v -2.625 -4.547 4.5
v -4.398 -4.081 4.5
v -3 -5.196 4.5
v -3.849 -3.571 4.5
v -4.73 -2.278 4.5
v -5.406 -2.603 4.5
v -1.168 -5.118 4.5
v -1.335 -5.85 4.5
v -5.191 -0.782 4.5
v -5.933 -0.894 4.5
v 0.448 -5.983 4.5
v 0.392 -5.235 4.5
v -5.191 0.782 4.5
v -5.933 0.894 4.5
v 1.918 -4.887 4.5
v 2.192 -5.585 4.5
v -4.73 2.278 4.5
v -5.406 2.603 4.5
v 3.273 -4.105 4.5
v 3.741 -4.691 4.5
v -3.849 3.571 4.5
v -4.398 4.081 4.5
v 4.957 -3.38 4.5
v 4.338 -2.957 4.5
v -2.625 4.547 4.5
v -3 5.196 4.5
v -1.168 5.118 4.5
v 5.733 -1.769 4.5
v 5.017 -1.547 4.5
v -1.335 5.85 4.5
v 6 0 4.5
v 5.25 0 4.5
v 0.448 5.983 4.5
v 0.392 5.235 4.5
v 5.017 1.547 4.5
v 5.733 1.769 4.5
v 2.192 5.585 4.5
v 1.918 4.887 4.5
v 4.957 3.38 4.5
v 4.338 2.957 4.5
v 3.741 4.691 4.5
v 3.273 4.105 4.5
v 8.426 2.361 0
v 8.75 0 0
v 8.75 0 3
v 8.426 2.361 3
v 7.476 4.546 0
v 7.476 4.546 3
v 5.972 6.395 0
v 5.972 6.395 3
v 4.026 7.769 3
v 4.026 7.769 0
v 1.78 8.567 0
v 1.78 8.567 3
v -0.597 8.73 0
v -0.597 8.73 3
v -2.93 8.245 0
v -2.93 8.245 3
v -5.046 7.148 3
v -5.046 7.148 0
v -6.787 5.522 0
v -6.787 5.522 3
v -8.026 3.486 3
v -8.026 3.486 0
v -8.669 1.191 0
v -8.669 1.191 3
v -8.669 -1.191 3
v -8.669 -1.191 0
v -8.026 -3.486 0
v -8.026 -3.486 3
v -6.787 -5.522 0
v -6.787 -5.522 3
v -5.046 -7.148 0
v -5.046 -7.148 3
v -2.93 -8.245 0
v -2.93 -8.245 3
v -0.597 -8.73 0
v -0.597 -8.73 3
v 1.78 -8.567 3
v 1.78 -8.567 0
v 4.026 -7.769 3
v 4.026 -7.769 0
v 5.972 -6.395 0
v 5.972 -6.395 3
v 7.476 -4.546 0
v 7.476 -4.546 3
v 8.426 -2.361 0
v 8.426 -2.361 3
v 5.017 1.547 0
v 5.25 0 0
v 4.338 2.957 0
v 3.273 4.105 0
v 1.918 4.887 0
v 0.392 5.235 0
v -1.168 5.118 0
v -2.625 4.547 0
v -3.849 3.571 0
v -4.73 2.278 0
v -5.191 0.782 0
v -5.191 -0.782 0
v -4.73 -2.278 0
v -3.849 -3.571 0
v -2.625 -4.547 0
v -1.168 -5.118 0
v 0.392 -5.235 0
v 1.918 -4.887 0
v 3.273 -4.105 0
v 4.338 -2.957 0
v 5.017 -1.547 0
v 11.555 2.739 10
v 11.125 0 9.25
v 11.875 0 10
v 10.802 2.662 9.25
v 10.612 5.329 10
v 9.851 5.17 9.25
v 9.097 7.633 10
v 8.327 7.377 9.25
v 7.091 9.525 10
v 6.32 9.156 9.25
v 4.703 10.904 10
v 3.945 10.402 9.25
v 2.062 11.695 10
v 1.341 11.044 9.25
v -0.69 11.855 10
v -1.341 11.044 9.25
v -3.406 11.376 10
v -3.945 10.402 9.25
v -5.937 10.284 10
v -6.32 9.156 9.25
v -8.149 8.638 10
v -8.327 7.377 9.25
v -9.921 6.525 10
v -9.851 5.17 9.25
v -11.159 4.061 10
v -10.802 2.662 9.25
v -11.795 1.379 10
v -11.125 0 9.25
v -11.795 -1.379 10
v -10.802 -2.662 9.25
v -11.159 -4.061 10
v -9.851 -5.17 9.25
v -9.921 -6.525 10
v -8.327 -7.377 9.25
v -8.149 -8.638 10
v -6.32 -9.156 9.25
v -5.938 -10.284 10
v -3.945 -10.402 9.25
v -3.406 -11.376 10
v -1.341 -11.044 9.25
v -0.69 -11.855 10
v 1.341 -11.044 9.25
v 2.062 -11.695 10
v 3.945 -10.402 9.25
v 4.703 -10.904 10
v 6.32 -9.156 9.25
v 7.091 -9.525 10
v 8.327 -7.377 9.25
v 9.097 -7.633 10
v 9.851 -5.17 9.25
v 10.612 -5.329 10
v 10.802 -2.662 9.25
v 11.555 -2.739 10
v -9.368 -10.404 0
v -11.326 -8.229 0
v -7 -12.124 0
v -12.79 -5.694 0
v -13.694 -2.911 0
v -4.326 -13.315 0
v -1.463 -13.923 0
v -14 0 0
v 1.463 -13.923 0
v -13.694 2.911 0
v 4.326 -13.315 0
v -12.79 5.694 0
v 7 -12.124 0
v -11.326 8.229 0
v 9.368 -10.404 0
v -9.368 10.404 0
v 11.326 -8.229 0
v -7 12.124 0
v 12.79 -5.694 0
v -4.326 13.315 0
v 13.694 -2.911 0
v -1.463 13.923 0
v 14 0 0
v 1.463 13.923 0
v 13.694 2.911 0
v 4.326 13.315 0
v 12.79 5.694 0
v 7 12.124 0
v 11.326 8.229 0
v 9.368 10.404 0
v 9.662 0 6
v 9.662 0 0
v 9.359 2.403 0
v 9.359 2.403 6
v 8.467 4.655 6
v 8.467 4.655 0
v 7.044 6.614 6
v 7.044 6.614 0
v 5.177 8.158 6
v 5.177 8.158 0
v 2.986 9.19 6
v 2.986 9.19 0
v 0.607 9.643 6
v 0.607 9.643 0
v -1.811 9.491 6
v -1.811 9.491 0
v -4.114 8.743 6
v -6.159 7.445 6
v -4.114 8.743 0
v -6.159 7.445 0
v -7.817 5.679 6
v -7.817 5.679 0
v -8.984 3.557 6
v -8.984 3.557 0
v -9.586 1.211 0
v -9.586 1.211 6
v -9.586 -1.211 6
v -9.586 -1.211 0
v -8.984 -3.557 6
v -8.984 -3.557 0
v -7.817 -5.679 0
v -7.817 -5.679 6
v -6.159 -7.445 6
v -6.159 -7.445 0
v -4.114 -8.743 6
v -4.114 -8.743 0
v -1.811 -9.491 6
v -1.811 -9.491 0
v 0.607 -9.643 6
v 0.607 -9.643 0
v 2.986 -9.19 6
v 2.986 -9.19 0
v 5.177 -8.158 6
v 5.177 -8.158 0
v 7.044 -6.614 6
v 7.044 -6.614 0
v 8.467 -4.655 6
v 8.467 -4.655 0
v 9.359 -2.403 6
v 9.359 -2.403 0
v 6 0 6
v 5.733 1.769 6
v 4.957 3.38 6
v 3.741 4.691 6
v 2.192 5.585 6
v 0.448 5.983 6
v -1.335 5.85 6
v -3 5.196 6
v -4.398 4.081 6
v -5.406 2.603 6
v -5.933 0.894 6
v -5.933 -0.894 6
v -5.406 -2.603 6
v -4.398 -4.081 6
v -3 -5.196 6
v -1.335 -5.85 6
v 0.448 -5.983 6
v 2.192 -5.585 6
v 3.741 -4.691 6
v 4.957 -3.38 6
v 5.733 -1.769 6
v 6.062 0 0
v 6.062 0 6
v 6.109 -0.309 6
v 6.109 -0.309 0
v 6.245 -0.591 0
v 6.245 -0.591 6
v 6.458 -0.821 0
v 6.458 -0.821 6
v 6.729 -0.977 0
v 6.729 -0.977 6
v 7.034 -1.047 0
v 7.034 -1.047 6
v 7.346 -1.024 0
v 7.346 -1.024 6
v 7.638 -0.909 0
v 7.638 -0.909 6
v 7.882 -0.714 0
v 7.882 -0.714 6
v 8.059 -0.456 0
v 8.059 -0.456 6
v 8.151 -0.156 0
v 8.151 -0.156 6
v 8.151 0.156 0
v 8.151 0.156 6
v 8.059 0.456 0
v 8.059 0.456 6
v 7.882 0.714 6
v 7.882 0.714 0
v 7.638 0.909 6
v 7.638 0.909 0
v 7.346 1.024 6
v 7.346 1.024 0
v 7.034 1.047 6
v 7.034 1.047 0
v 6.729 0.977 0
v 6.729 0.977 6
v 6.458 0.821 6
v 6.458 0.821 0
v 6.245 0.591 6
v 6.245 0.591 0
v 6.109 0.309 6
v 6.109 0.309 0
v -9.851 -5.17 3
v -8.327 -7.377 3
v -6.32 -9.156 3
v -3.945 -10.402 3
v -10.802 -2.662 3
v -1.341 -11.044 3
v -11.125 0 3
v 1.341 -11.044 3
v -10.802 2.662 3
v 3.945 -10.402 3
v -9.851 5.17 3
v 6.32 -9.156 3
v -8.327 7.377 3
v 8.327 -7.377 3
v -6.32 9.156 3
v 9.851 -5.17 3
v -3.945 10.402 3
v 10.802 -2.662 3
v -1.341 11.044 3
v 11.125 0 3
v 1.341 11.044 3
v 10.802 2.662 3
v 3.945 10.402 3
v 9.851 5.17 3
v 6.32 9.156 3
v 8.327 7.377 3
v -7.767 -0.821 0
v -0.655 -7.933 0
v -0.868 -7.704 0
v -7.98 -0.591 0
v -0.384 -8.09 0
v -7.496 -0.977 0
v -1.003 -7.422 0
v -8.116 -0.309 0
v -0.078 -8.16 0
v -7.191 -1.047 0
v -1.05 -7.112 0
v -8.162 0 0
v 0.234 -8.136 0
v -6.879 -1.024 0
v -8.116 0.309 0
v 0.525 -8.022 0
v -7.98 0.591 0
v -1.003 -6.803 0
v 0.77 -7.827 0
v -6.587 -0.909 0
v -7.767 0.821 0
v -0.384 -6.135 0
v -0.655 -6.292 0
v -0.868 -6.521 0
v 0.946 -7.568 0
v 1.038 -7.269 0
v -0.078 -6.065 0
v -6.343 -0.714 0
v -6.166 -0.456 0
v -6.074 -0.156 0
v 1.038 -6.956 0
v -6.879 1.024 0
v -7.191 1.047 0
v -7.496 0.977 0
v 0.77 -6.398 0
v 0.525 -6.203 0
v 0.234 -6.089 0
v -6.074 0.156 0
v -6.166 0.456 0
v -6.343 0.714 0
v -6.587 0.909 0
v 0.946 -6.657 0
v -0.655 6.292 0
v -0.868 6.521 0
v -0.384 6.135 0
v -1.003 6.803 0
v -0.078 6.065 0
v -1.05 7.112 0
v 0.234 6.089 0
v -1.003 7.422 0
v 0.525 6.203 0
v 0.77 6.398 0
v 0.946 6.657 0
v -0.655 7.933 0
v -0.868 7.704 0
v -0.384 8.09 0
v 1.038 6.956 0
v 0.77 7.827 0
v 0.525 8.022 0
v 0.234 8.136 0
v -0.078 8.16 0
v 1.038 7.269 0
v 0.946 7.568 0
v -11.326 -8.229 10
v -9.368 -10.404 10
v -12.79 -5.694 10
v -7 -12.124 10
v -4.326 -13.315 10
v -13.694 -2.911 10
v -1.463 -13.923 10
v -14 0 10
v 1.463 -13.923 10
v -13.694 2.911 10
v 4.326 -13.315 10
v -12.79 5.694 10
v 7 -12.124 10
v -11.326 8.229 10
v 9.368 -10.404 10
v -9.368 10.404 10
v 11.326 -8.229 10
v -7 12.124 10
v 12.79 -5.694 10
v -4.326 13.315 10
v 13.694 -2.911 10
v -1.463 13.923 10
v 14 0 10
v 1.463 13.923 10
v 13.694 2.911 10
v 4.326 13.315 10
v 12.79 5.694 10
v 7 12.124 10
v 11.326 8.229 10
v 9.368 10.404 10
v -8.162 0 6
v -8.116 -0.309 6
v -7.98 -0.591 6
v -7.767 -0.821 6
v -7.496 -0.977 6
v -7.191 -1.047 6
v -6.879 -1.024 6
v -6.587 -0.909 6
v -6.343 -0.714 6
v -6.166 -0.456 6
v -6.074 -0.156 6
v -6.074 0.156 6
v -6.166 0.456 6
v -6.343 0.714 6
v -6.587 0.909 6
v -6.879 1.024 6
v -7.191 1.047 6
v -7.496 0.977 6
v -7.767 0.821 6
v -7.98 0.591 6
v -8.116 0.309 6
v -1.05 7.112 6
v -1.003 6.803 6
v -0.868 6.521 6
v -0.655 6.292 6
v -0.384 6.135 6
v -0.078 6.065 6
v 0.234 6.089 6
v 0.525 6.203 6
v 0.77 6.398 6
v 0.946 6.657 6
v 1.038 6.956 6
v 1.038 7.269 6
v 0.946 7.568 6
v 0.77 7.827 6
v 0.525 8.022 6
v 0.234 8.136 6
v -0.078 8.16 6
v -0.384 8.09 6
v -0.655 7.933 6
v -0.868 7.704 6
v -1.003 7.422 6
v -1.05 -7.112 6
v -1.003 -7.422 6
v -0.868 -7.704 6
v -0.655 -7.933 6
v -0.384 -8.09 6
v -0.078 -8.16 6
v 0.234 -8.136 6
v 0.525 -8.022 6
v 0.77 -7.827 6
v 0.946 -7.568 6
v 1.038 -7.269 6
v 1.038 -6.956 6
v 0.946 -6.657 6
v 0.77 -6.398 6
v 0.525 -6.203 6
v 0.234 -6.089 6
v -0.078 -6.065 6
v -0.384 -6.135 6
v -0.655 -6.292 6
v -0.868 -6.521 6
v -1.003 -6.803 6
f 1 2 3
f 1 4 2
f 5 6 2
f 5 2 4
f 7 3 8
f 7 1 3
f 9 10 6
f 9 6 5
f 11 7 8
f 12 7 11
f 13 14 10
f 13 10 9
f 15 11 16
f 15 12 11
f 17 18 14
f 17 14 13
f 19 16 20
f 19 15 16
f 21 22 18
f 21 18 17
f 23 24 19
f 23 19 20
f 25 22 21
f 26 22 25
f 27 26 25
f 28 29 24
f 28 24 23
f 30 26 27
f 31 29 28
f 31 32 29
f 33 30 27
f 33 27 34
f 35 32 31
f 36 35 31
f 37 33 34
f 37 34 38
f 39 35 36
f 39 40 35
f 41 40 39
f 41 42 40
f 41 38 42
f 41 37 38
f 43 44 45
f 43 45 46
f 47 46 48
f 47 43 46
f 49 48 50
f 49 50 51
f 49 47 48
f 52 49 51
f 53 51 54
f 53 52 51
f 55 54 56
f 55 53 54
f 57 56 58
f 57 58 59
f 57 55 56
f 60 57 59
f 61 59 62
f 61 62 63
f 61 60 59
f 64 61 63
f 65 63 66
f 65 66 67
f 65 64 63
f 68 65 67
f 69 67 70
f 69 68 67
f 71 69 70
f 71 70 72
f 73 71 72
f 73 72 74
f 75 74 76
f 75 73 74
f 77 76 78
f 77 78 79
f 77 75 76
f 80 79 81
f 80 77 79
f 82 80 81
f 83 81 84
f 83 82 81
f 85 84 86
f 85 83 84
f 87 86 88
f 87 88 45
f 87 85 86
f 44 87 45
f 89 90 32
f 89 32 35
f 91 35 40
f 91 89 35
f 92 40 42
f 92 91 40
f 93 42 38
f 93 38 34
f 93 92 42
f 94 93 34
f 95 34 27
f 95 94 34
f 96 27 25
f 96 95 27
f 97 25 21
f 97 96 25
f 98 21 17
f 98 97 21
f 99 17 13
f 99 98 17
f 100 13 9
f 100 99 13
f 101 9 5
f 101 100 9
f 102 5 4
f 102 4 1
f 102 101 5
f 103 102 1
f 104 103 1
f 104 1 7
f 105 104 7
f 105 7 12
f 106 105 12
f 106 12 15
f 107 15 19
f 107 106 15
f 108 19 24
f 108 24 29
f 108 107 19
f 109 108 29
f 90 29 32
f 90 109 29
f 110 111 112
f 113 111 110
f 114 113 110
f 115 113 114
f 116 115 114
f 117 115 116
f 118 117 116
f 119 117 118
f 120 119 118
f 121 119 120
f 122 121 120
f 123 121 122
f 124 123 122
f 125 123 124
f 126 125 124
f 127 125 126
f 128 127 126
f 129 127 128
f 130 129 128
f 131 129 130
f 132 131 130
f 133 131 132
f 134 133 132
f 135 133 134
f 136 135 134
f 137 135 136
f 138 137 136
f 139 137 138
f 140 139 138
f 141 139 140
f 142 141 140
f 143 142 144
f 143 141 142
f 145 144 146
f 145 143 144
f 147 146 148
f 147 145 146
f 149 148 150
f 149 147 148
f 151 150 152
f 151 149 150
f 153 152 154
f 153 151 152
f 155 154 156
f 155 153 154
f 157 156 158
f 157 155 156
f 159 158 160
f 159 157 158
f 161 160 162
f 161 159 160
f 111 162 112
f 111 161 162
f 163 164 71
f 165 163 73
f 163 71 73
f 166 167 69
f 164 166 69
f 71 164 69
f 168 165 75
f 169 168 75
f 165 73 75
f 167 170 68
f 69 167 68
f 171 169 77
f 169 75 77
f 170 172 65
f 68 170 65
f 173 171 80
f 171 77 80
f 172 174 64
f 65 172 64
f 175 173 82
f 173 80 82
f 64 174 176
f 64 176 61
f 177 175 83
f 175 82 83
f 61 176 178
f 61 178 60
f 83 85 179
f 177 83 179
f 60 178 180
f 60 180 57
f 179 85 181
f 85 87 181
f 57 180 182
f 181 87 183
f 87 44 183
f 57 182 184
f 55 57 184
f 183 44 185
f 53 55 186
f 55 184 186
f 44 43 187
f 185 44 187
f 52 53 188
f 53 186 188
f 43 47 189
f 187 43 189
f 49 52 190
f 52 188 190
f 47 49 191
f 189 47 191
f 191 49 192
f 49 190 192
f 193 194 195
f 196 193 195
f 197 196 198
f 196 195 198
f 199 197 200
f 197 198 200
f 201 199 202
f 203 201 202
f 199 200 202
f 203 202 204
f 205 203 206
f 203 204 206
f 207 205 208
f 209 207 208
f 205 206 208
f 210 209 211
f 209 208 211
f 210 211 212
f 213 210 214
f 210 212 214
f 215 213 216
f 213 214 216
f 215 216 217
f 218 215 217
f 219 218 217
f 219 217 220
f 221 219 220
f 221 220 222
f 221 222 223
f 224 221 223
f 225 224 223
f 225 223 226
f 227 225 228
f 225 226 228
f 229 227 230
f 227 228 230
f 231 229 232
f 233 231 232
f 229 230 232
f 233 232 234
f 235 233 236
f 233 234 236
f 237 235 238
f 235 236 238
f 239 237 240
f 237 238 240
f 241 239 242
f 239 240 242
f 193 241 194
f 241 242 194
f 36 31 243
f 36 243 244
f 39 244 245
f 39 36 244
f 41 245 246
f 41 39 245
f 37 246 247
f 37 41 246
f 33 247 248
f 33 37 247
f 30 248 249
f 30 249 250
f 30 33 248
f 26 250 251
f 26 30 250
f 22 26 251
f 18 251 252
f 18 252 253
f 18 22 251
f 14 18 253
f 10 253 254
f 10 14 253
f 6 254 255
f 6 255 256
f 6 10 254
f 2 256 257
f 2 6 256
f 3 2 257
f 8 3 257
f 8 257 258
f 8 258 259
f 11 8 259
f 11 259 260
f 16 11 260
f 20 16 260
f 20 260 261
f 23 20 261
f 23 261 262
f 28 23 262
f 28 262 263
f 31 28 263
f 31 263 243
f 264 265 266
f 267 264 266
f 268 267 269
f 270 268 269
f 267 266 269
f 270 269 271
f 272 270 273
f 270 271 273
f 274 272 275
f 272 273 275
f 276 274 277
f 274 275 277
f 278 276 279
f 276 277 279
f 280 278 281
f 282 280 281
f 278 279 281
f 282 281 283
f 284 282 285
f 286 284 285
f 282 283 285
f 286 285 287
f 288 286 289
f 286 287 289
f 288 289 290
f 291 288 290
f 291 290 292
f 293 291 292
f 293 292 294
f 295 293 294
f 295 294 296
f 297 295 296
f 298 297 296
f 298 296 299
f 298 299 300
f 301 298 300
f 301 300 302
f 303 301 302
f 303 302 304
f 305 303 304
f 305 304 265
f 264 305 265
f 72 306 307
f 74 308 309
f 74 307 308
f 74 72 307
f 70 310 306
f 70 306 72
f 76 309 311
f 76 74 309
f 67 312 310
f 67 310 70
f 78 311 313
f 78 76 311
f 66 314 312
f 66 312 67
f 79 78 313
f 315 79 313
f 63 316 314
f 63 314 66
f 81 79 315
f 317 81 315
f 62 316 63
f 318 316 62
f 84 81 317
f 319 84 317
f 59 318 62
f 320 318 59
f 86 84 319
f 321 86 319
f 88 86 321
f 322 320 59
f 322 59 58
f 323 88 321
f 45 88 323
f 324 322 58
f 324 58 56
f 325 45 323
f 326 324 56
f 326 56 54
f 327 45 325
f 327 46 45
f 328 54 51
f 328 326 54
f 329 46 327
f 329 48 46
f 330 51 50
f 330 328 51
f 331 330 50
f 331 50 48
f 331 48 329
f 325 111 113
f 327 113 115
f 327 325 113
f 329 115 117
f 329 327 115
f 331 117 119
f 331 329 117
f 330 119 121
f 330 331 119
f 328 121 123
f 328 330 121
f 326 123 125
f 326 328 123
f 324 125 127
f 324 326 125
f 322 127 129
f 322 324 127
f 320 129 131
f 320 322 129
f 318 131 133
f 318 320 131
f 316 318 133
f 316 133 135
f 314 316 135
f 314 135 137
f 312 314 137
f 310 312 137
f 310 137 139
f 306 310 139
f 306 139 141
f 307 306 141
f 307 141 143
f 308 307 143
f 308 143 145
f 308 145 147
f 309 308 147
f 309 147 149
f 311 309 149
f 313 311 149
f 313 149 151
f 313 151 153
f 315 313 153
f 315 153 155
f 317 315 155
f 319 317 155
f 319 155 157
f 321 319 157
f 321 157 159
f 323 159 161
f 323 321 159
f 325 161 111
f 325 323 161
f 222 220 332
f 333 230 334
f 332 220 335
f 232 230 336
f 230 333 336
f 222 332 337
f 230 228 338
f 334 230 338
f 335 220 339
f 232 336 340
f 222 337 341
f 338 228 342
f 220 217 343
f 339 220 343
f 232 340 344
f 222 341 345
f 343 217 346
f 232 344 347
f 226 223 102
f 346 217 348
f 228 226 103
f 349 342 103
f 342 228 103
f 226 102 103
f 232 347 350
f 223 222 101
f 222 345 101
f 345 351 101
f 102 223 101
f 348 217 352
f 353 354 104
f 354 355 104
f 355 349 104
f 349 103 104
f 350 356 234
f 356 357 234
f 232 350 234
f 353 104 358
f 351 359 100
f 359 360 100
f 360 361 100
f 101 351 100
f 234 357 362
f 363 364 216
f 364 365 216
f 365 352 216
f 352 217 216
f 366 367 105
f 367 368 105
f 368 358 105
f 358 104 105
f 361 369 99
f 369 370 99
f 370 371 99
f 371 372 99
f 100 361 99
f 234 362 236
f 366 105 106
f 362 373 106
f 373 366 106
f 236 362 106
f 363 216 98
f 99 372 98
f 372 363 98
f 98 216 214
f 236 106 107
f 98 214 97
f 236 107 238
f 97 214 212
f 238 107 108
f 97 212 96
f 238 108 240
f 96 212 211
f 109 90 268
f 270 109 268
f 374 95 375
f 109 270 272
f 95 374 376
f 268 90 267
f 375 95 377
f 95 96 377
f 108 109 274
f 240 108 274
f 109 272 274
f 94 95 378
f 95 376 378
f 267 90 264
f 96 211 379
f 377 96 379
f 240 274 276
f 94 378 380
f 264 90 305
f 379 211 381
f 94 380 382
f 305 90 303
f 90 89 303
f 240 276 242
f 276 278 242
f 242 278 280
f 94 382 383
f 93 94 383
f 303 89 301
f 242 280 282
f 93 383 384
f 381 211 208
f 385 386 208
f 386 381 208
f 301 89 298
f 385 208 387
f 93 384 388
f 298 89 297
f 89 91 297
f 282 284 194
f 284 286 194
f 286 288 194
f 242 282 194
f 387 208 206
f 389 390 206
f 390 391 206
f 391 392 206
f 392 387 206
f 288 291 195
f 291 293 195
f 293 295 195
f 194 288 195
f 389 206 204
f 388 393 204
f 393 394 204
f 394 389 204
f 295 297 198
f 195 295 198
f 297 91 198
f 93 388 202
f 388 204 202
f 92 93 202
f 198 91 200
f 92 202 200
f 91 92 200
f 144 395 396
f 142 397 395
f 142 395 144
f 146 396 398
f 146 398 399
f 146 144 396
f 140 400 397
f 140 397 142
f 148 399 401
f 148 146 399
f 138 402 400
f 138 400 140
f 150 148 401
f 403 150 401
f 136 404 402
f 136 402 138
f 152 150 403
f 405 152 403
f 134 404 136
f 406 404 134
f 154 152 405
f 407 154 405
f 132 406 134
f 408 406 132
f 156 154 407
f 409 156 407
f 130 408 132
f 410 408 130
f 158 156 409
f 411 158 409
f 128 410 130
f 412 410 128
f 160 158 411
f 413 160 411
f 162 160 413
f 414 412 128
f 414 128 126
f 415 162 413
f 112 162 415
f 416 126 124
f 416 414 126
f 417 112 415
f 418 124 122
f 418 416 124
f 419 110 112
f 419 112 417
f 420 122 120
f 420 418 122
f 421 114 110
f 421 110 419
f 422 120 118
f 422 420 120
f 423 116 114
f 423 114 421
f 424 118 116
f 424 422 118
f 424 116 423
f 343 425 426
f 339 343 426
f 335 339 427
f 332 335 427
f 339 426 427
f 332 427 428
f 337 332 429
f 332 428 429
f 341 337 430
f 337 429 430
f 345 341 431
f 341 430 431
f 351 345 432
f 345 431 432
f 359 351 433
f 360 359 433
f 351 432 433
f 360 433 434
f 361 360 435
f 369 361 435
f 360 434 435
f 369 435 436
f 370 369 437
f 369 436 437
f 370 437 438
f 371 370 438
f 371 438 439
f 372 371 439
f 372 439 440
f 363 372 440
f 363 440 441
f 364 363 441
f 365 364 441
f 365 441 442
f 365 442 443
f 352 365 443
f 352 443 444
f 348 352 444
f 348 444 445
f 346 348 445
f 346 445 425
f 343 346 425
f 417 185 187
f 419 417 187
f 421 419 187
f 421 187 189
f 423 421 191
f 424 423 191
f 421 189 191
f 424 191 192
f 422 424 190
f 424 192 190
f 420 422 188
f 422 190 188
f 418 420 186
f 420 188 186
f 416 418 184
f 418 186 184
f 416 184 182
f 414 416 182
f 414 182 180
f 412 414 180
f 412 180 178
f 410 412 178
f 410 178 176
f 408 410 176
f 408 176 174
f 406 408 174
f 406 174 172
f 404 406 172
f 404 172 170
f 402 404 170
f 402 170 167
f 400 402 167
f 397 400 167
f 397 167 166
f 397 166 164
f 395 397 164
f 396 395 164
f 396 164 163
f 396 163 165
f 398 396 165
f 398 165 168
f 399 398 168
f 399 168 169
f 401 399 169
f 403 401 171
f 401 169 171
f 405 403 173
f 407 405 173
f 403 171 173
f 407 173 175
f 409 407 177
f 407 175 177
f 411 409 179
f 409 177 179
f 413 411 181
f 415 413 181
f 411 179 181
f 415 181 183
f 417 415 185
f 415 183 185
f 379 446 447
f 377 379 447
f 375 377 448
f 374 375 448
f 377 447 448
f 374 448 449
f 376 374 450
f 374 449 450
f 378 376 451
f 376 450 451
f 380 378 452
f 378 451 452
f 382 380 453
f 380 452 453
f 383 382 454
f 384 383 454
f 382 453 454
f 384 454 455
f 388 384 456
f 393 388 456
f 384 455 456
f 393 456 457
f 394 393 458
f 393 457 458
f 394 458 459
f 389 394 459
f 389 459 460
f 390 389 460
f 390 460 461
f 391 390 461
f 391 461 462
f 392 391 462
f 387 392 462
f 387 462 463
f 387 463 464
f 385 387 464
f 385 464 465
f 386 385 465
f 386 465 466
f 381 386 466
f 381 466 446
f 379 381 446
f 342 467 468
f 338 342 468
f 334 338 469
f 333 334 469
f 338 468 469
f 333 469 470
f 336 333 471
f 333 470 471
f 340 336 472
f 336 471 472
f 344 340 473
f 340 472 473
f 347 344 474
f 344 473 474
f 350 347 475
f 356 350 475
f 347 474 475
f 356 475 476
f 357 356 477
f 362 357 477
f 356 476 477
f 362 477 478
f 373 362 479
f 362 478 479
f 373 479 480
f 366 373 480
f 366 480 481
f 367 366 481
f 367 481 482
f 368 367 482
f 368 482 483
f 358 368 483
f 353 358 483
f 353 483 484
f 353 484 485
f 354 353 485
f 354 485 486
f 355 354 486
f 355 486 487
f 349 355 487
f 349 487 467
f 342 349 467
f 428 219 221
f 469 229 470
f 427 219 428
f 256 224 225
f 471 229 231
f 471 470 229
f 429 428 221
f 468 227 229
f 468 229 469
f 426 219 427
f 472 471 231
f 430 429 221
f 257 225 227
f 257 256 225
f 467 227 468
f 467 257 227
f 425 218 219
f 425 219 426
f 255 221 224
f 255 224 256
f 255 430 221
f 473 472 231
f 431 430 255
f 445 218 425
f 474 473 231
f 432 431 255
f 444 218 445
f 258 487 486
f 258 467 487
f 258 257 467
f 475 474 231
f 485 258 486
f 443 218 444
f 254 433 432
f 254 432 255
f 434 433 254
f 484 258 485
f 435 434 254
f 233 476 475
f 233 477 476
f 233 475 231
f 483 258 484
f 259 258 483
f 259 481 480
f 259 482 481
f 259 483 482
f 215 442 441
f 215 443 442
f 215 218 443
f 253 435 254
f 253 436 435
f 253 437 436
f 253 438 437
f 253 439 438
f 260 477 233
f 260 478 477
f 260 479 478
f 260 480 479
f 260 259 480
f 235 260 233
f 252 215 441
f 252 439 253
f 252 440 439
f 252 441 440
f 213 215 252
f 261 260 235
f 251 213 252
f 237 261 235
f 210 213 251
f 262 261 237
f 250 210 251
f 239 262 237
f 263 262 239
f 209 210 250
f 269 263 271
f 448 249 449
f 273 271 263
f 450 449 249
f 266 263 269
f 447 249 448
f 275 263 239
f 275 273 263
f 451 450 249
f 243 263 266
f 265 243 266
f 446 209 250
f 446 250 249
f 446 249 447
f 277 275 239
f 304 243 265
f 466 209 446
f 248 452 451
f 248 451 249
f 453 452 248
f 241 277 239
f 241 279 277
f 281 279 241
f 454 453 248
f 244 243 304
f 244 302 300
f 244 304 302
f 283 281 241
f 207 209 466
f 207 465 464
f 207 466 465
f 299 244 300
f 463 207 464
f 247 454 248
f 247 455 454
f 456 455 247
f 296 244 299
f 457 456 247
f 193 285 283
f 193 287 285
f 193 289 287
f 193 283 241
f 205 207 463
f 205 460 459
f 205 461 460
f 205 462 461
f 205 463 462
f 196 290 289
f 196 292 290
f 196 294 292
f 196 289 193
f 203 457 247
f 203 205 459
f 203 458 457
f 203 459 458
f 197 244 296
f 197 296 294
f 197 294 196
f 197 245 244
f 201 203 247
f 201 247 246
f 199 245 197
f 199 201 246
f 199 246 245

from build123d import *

# Parameters (mm, degrees)
F6_R      = 6
F6_R_2    = 5.25
F7_DEPTH  = 4.5
F6_R_3    = 9.6625
F8_DEPTH  = 6
F9_D      = 2.1
F10_R     = 14
F10_R_2   = 11.125
F10_R_3   = 8.75
F11_DEPTH = 3
F12_R     = 14
F12_R_2   = 11.125
F13_DEPTH = 10
F14_SIZE  = 0.75


with BuildPart() as f7:
    # F6 (on Top) → F7 (new body)
    with BuildSketch(Plane.XY):
        Circle(F6_R)
        Circle(F6_R_2, mode=Mode.SUBTRACT)
    extrude(amount=F7_DEPTH)

    # F6 (on Top) → F8 (join)
    with BuildSketch(Plane.XY):
        Circle(F6_R_3)
        Circle(F6_R, mode=Mode.SUBTRACT)
    extrude(amount=F8_DEPTH)

    # F9 (through all)
    with Locations(Plane(origin=(0, 0, 0), x_dir=(1, 0, 0), z_dir=(0, 0, -1))):
        with Locations((0, -7.1125), (7.1125, 0), (-7.1125, 0), (0, 7.1125)):
            Hole(F9_D / 2)


with BuildPart() as f11:
    # F10 (on Top) → F11 (new body)
    with BuildSketch(Plane.XY):
        Circle(F10_R)
        Circle(F10_R_2, mode=Mode.SUBTRACT)
        Circle(F10_R_2)
        Circle(F10_R_3, mode=Mode.SUBTRACT)
    extrude(amount=F11_DEPTH)

    # F12 (on face) → F13 (join)
    with BuildSketch(Plane.XY):
        Circle(F12_R)
        Circle(F12_R_2, mode=Mode.SUBTRACT)
    extrude(amount=F13_DEPTH)

    # F14
    f14_edges = [f11.edges().sort_by_distance(p)[0] for p in [
        (-11.125, 0, 10),
    ]]
    chamfer(f14_edges, length=F14_SIZE)


solid = Compound([f7.part, f11.part])
